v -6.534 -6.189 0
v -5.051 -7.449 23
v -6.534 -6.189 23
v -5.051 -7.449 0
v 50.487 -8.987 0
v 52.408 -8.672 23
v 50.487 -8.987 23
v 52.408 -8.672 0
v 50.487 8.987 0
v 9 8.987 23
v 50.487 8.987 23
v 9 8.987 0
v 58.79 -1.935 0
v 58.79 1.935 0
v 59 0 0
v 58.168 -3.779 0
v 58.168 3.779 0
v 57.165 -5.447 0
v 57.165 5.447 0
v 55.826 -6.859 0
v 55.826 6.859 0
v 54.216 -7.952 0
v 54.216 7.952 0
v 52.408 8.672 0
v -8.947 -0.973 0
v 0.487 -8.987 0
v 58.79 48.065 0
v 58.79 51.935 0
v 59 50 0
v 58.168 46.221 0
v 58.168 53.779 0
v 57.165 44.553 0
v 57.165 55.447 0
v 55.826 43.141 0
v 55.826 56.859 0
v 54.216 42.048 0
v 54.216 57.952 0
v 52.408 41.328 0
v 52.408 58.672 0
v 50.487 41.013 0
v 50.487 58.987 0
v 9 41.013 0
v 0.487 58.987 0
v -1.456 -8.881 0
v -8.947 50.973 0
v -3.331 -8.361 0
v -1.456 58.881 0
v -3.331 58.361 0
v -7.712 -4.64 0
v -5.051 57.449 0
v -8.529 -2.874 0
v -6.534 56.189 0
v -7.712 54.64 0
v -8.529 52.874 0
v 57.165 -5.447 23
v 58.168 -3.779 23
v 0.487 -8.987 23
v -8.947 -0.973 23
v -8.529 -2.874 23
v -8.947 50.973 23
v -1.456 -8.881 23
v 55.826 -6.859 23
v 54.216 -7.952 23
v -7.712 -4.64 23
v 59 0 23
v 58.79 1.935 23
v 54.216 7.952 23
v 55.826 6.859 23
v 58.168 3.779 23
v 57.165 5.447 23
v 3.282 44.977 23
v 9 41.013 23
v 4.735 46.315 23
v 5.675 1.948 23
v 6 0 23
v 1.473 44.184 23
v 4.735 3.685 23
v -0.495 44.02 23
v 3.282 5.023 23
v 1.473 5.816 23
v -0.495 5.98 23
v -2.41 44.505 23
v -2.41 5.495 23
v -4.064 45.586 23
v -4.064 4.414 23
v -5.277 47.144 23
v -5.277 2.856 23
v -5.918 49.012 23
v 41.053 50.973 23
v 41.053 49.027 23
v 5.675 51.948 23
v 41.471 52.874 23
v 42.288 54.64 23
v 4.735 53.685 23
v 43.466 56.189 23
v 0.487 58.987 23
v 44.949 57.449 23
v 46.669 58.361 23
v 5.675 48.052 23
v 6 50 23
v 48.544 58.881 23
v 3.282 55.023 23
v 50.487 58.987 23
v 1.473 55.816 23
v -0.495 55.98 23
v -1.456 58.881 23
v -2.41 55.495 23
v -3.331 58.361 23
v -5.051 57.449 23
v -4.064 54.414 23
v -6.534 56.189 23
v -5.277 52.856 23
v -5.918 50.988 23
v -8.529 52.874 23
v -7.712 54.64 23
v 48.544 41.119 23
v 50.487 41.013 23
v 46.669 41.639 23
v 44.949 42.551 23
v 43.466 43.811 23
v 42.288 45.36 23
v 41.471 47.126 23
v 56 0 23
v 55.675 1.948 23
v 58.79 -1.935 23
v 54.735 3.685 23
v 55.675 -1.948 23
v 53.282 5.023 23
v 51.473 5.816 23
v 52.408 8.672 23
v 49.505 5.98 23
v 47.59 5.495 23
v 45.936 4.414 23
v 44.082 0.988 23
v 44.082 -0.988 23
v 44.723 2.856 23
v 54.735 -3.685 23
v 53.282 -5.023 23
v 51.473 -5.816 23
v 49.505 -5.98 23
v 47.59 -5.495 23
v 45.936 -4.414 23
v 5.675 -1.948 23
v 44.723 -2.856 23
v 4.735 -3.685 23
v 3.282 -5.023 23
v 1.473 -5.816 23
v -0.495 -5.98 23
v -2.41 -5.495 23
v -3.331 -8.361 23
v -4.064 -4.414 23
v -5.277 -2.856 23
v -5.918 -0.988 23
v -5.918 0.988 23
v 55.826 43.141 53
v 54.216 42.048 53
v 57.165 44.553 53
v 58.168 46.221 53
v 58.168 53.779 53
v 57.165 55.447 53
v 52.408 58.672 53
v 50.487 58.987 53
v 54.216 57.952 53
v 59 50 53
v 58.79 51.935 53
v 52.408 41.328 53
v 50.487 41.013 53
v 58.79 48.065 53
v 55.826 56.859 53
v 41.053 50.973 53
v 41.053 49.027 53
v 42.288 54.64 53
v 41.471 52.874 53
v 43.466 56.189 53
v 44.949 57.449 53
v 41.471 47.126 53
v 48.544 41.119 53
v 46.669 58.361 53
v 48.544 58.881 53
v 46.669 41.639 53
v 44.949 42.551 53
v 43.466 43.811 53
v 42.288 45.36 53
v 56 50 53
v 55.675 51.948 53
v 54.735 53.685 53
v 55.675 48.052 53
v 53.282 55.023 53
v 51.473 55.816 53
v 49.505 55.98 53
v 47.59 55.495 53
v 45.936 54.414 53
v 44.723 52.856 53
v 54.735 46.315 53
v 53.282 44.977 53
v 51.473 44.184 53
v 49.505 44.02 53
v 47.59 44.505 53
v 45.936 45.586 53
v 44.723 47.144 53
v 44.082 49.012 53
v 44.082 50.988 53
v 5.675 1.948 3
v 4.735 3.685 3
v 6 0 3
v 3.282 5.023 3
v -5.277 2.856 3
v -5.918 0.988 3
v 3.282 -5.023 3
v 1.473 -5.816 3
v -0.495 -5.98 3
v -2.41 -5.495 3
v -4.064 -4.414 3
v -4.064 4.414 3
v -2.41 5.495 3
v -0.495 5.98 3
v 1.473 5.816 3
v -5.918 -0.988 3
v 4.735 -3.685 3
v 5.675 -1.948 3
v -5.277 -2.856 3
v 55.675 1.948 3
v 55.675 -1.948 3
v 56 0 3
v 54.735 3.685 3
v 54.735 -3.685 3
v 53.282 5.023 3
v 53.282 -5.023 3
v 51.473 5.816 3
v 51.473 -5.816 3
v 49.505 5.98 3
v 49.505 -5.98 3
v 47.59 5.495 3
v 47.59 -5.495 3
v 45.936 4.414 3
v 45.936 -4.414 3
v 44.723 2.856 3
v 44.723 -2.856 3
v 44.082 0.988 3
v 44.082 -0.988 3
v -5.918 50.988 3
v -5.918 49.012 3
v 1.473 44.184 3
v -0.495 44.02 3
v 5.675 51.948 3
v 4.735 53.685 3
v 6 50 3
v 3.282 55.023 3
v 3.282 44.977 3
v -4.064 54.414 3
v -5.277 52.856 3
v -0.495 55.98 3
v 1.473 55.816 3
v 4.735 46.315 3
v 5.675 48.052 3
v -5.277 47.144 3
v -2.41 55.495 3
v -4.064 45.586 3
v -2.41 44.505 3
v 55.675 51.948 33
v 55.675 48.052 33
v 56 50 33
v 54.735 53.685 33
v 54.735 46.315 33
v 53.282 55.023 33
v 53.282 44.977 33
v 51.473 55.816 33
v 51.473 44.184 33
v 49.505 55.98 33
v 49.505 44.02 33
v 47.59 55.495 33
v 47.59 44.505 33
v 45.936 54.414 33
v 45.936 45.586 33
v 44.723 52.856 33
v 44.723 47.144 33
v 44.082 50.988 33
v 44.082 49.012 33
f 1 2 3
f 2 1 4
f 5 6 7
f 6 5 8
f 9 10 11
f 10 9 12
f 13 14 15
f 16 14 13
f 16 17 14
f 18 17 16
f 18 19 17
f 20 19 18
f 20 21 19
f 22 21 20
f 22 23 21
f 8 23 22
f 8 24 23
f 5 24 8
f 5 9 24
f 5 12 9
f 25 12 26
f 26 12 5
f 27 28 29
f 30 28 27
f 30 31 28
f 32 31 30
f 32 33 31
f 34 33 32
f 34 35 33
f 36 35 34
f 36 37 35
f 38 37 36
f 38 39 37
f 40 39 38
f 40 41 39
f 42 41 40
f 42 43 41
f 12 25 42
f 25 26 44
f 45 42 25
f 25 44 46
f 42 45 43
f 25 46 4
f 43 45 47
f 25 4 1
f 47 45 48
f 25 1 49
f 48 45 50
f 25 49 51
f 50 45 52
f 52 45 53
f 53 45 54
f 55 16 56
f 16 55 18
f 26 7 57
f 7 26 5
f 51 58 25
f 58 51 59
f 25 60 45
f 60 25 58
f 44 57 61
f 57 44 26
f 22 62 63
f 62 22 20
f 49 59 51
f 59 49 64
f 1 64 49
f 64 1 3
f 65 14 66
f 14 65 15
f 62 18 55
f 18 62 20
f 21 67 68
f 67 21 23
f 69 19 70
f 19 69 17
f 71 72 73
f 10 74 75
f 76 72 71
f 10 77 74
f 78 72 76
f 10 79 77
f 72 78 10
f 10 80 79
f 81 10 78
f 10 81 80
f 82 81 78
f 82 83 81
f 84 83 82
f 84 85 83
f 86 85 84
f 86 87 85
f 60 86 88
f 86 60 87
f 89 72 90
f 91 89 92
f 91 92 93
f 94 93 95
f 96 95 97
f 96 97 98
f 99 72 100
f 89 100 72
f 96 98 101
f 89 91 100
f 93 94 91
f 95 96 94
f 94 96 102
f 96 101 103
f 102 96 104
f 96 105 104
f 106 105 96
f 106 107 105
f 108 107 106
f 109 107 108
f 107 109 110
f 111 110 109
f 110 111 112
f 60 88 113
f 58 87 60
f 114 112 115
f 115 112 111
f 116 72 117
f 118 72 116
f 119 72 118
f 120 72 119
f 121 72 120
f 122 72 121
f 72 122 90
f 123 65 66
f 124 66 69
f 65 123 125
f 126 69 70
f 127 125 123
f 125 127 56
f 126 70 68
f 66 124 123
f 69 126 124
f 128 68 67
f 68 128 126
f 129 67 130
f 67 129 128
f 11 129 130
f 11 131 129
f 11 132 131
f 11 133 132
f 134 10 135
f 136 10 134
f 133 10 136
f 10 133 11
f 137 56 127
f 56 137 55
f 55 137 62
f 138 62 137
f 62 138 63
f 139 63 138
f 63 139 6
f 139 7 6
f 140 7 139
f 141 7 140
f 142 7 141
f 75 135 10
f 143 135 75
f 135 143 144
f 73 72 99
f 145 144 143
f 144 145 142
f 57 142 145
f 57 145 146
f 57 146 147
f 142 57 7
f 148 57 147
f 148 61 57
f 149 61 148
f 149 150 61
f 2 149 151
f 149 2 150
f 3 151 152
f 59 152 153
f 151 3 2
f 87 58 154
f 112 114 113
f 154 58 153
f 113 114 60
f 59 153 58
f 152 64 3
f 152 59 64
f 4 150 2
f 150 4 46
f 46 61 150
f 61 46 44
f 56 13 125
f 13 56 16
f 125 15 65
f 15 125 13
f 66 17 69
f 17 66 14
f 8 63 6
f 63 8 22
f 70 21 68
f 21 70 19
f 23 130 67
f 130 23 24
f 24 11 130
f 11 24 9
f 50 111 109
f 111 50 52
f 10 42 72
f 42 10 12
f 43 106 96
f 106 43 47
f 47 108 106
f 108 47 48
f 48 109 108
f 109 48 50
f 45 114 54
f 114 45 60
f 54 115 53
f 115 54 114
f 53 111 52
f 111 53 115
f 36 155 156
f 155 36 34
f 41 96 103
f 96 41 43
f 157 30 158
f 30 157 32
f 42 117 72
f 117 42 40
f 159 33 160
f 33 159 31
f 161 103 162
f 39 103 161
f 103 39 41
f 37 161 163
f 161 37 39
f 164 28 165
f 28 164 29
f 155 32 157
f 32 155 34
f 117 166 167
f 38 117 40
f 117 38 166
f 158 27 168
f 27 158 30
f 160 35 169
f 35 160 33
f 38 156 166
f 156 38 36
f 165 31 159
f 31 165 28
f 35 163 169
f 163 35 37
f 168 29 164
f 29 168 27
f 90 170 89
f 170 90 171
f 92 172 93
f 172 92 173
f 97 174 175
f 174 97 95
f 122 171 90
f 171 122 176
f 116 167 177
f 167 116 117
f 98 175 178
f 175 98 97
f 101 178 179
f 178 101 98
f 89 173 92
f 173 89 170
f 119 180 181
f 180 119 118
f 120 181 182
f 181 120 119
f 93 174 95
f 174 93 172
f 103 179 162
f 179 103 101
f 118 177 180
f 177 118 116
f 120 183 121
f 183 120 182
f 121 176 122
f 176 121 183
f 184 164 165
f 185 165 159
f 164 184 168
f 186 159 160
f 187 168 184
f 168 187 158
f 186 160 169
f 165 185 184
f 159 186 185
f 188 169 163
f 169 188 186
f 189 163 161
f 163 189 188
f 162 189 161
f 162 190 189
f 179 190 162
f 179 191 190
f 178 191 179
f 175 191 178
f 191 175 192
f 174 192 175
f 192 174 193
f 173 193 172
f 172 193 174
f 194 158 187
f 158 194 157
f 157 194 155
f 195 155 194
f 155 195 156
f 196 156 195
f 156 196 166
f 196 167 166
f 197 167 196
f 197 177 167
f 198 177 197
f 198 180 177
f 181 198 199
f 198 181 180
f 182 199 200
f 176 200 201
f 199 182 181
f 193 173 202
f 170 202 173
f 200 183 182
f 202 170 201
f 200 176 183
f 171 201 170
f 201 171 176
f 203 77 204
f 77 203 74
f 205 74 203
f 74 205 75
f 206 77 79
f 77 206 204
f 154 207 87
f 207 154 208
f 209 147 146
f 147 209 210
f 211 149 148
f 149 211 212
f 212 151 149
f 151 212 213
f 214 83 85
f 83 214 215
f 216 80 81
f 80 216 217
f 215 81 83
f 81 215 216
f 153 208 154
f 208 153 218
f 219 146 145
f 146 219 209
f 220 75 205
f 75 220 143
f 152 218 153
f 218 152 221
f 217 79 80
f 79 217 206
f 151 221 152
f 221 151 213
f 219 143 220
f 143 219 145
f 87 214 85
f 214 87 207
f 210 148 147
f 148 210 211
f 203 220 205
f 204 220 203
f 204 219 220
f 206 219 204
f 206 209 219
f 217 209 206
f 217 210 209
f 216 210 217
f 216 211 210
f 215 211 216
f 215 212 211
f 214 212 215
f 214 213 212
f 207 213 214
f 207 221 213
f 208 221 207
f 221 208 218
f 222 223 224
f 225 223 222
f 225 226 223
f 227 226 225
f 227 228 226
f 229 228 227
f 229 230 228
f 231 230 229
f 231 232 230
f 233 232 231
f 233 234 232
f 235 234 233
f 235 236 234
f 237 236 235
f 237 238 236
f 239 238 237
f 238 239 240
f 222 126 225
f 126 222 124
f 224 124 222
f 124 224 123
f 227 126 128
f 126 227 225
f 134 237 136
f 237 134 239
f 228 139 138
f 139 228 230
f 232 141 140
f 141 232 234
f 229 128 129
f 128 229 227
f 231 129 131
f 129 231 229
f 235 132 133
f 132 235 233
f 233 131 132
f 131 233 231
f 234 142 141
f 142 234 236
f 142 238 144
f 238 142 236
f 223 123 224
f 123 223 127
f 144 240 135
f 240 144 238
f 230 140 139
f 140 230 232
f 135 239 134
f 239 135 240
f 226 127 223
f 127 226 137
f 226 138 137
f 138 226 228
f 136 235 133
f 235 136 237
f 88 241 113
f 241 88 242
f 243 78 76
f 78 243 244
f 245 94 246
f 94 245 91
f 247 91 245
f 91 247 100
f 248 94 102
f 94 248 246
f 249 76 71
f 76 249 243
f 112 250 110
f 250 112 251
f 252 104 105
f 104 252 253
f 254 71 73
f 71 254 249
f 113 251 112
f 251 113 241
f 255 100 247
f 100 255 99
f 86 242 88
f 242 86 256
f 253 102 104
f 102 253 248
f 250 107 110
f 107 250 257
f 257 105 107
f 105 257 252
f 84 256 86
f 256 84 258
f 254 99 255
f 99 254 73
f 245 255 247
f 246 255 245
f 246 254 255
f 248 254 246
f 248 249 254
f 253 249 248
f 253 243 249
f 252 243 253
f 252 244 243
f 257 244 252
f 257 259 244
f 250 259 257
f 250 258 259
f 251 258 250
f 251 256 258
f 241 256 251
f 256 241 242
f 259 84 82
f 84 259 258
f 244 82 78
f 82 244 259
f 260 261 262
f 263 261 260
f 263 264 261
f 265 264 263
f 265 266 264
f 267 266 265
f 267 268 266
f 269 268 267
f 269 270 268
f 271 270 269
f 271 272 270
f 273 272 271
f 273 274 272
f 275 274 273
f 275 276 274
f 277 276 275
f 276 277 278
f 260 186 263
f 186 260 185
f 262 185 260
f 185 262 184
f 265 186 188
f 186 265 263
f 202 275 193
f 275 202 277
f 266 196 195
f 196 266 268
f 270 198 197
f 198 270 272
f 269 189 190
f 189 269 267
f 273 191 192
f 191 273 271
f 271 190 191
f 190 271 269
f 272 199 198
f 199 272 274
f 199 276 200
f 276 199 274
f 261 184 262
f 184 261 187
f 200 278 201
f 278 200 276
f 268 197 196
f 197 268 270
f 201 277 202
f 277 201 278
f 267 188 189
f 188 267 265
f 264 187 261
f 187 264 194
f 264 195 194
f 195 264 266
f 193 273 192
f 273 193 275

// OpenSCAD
module wall ()
{
    cylinder(23, 9, 9);
}

module hole ()
{
    translate([0, 0, 3]) {
        cylinder(20, 6, 6);
    }
}

difference() {
    union() {
        hull() {
            wall();
            translate([50, 0, 0]) {
                wall();
            }
        }
        
        hull() {
            wall();
            translate([0, 50, 0]) {
                wall();
            }
        }
        
        hull() {
            translate([0, 50, 0]) {
                wall();
            }
            translate([50, 50, 0]) {
                wall();
            }
        }

        hull() {
            translate([50, 50, 0]) {
                wall();
            }
            translate([50, 50, 30]) {
                wall();
            }
        }
    }
    
    hole();
    translate([50, 0, 0]) {
        hole();
    }
    translate([0, 50, 0]) {
        hole();
    }
    translate([50, 50, 30]) {
        hole();
    }
}
